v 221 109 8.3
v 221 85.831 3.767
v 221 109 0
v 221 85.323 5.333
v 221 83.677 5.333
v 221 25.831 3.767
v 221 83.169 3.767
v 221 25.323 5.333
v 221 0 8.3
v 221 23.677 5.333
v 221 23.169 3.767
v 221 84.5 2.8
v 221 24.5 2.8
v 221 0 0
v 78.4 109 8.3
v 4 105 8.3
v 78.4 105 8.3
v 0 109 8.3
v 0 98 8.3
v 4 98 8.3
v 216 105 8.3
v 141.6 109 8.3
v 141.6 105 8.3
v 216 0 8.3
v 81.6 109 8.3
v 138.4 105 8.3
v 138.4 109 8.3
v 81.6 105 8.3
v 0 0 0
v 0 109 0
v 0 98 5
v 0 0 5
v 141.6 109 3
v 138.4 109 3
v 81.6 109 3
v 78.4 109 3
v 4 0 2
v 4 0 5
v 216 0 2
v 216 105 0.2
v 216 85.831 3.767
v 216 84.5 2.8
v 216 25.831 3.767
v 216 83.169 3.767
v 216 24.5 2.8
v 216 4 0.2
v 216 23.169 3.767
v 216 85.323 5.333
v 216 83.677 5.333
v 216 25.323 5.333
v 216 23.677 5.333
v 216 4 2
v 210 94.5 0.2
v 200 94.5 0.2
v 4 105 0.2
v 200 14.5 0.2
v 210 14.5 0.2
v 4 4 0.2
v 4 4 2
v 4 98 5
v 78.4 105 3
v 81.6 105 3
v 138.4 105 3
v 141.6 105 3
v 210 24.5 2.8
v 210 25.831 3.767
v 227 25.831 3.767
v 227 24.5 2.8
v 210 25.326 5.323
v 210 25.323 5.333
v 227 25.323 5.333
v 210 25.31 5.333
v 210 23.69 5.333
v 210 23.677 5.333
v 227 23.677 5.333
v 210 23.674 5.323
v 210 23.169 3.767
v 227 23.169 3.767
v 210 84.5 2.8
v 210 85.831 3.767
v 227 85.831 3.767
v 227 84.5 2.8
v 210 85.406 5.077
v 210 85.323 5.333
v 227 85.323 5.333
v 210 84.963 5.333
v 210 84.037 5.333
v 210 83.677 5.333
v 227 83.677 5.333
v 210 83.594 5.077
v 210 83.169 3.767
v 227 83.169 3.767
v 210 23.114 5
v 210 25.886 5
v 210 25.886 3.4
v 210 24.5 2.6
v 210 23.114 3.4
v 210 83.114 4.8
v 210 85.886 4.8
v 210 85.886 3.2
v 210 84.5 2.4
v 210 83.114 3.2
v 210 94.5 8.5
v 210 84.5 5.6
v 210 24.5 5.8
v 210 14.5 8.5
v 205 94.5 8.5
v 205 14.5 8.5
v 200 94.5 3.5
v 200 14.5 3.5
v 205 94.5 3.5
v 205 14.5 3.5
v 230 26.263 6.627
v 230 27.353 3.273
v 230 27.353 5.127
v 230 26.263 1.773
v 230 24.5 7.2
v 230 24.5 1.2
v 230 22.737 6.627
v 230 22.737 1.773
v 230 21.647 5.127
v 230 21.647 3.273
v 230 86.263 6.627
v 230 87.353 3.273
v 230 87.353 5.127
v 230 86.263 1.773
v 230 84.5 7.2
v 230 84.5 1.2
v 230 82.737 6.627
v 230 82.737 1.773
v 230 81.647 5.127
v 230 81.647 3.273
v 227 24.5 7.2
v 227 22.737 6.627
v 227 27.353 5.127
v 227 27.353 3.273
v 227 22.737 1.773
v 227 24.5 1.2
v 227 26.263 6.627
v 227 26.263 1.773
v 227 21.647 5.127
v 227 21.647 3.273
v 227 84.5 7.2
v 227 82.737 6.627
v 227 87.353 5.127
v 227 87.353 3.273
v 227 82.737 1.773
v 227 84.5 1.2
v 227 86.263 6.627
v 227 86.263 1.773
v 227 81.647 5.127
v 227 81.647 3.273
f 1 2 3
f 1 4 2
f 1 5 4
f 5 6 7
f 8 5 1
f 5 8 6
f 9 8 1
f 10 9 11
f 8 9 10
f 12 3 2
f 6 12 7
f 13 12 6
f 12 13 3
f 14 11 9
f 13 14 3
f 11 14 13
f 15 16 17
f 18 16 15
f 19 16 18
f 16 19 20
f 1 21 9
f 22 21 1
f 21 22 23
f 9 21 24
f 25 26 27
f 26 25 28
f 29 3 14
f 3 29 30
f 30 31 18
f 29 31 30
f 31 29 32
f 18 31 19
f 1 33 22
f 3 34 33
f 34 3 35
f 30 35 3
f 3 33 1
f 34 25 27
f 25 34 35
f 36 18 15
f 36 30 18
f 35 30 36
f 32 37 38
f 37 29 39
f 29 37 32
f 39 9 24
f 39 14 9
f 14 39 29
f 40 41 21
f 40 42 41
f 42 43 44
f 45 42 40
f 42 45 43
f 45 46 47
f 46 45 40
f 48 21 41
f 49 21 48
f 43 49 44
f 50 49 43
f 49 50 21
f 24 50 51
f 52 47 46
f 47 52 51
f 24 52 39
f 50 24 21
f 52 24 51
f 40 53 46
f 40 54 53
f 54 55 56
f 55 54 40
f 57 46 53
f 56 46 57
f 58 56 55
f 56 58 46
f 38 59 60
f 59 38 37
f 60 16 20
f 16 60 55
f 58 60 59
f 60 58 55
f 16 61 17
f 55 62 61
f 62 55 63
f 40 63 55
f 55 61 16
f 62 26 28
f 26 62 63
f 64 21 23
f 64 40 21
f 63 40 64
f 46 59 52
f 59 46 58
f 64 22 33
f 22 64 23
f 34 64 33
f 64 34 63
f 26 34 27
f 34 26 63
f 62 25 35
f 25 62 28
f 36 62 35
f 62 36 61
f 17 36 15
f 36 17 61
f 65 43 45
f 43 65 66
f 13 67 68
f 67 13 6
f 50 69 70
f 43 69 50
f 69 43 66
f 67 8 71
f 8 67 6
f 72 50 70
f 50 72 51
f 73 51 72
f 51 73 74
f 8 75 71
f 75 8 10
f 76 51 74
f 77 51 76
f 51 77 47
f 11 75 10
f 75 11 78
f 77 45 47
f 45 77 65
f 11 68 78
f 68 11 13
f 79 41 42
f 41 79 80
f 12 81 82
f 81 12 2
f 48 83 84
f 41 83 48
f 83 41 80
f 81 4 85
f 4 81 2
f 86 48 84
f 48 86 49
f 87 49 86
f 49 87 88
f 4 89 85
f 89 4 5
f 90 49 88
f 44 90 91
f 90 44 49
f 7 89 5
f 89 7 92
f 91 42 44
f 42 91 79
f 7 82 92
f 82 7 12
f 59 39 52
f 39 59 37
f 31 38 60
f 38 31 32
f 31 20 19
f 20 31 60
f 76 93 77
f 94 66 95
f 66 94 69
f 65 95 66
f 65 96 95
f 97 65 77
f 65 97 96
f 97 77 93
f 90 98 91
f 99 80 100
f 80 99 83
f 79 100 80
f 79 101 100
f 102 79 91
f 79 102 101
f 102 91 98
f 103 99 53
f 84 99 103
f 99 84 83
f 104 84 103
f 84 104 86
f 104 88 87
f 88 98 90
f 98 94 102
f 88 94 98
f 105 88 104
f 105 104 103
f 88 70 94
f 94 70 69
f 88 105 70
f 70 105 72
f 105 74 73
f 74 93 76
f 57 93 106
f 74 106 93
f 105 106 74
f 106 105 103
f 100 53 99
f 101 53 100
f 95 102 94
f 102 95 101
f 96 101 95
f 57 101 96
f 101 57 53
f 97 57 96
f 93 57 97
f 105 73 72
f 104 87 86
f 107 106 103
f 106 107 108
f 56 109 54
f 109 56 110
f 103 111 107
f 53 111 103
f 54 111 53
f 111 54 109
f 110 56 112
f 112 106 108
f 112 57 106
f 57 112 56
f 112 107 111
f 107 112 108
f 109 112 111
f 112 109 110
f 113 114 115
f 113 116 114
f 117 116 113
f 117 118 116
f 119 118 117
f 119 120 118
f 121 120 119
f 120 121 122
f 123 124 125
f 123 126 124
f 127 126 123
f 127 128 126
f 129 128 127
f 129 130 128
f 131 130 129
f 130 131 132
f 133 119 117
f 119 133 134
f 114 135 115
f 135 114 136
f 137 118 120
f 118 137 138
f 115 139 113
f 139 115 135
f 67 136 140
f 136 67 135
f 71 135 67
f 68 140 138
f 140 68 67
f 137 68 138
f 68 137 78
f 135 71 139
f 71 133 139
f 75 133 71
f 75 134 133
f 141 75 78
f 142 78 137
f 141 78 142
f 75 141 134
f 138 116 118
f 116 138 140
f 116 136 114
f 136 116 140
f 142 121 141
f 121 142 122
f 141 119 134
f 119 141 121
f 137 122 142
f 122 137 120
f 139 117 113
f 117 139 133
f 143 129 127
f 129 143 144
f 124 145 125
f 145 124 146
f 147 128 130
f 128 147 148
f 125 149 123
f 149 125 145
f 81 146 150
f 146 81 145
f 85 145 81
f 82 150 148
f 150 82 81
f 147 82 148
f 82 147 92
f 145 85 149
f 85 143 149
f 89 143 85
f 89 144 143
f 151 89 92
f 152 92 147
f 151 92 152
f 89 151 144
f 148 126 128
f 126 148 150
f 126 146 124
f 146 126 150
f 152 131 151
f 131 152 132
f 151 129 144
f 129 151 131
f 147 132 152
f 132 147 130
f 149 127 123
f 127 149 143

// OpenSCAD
        //Select, please
//plate_holder_200();
//plate_pusher();
complete();

module plate_holder_200(){    
difference(){
   translate([0, 0, 0]) cube([221,109,8.3]);
   translate([4, 4, 0.2]) cube([212,101,10]);
   translate([140, 100, 6]) cube([3.2, 20, 6], center=true);
   translate([80, 100, 6]) cube([3.2, 20, 6], center=true);
   //holes for 3-mm screw tap
   translate([210, 24.5, 4.2])
   rotate([0, 90, 0]) cylinder(h=20, r=1.4);
   translate([210, 24.5+60, 4.2])
   rotate([0, 90, 0]) cylinder(h=20, r=1.4);
   translate([4, 0, 2]) cube([212, 4, 10]);
   translate([0, 0, 5]) cube([5, 98, 5]);
   }
}
module plate_pusher() {
    difference() {
    translate([200, 14.5, 0.2]) cube([10, 80, 8.3]);
    //holes to receive the 3-mm screws
    translate([210, 24.5, 4.2]) rotate([0, 90, 0]) cylinder(h=6, r=1.6);
    translate([210, 24.5+60, 4]) rotate([0, 90, 0])  cylinder(h=6, r=1.6);
    translate([200, 14.5, 3.5]) cube([5, 80, 5]);
    }
}
module screws() {
   translate([210, 24.5, 4.2])
   rotate([0, 90, 0]) cylinder(h=20, r=1.4);
   translate([210, 24.5+60, 4.2])
   rotate([0, 90, 0]) cylinder(h=20, r=1.4);
   translate([227, 24.5, 4.2])
   rotate([0, 90, 0]) cylinder(h=3, r=3);
   translate([227, 24.5+60, 4.2])
   rotate([0, 90, 0]) cylinder(h=3, r=3);
}
module complete() {
    plate_holder_200();
    plate_pusher();
    screws();
}
